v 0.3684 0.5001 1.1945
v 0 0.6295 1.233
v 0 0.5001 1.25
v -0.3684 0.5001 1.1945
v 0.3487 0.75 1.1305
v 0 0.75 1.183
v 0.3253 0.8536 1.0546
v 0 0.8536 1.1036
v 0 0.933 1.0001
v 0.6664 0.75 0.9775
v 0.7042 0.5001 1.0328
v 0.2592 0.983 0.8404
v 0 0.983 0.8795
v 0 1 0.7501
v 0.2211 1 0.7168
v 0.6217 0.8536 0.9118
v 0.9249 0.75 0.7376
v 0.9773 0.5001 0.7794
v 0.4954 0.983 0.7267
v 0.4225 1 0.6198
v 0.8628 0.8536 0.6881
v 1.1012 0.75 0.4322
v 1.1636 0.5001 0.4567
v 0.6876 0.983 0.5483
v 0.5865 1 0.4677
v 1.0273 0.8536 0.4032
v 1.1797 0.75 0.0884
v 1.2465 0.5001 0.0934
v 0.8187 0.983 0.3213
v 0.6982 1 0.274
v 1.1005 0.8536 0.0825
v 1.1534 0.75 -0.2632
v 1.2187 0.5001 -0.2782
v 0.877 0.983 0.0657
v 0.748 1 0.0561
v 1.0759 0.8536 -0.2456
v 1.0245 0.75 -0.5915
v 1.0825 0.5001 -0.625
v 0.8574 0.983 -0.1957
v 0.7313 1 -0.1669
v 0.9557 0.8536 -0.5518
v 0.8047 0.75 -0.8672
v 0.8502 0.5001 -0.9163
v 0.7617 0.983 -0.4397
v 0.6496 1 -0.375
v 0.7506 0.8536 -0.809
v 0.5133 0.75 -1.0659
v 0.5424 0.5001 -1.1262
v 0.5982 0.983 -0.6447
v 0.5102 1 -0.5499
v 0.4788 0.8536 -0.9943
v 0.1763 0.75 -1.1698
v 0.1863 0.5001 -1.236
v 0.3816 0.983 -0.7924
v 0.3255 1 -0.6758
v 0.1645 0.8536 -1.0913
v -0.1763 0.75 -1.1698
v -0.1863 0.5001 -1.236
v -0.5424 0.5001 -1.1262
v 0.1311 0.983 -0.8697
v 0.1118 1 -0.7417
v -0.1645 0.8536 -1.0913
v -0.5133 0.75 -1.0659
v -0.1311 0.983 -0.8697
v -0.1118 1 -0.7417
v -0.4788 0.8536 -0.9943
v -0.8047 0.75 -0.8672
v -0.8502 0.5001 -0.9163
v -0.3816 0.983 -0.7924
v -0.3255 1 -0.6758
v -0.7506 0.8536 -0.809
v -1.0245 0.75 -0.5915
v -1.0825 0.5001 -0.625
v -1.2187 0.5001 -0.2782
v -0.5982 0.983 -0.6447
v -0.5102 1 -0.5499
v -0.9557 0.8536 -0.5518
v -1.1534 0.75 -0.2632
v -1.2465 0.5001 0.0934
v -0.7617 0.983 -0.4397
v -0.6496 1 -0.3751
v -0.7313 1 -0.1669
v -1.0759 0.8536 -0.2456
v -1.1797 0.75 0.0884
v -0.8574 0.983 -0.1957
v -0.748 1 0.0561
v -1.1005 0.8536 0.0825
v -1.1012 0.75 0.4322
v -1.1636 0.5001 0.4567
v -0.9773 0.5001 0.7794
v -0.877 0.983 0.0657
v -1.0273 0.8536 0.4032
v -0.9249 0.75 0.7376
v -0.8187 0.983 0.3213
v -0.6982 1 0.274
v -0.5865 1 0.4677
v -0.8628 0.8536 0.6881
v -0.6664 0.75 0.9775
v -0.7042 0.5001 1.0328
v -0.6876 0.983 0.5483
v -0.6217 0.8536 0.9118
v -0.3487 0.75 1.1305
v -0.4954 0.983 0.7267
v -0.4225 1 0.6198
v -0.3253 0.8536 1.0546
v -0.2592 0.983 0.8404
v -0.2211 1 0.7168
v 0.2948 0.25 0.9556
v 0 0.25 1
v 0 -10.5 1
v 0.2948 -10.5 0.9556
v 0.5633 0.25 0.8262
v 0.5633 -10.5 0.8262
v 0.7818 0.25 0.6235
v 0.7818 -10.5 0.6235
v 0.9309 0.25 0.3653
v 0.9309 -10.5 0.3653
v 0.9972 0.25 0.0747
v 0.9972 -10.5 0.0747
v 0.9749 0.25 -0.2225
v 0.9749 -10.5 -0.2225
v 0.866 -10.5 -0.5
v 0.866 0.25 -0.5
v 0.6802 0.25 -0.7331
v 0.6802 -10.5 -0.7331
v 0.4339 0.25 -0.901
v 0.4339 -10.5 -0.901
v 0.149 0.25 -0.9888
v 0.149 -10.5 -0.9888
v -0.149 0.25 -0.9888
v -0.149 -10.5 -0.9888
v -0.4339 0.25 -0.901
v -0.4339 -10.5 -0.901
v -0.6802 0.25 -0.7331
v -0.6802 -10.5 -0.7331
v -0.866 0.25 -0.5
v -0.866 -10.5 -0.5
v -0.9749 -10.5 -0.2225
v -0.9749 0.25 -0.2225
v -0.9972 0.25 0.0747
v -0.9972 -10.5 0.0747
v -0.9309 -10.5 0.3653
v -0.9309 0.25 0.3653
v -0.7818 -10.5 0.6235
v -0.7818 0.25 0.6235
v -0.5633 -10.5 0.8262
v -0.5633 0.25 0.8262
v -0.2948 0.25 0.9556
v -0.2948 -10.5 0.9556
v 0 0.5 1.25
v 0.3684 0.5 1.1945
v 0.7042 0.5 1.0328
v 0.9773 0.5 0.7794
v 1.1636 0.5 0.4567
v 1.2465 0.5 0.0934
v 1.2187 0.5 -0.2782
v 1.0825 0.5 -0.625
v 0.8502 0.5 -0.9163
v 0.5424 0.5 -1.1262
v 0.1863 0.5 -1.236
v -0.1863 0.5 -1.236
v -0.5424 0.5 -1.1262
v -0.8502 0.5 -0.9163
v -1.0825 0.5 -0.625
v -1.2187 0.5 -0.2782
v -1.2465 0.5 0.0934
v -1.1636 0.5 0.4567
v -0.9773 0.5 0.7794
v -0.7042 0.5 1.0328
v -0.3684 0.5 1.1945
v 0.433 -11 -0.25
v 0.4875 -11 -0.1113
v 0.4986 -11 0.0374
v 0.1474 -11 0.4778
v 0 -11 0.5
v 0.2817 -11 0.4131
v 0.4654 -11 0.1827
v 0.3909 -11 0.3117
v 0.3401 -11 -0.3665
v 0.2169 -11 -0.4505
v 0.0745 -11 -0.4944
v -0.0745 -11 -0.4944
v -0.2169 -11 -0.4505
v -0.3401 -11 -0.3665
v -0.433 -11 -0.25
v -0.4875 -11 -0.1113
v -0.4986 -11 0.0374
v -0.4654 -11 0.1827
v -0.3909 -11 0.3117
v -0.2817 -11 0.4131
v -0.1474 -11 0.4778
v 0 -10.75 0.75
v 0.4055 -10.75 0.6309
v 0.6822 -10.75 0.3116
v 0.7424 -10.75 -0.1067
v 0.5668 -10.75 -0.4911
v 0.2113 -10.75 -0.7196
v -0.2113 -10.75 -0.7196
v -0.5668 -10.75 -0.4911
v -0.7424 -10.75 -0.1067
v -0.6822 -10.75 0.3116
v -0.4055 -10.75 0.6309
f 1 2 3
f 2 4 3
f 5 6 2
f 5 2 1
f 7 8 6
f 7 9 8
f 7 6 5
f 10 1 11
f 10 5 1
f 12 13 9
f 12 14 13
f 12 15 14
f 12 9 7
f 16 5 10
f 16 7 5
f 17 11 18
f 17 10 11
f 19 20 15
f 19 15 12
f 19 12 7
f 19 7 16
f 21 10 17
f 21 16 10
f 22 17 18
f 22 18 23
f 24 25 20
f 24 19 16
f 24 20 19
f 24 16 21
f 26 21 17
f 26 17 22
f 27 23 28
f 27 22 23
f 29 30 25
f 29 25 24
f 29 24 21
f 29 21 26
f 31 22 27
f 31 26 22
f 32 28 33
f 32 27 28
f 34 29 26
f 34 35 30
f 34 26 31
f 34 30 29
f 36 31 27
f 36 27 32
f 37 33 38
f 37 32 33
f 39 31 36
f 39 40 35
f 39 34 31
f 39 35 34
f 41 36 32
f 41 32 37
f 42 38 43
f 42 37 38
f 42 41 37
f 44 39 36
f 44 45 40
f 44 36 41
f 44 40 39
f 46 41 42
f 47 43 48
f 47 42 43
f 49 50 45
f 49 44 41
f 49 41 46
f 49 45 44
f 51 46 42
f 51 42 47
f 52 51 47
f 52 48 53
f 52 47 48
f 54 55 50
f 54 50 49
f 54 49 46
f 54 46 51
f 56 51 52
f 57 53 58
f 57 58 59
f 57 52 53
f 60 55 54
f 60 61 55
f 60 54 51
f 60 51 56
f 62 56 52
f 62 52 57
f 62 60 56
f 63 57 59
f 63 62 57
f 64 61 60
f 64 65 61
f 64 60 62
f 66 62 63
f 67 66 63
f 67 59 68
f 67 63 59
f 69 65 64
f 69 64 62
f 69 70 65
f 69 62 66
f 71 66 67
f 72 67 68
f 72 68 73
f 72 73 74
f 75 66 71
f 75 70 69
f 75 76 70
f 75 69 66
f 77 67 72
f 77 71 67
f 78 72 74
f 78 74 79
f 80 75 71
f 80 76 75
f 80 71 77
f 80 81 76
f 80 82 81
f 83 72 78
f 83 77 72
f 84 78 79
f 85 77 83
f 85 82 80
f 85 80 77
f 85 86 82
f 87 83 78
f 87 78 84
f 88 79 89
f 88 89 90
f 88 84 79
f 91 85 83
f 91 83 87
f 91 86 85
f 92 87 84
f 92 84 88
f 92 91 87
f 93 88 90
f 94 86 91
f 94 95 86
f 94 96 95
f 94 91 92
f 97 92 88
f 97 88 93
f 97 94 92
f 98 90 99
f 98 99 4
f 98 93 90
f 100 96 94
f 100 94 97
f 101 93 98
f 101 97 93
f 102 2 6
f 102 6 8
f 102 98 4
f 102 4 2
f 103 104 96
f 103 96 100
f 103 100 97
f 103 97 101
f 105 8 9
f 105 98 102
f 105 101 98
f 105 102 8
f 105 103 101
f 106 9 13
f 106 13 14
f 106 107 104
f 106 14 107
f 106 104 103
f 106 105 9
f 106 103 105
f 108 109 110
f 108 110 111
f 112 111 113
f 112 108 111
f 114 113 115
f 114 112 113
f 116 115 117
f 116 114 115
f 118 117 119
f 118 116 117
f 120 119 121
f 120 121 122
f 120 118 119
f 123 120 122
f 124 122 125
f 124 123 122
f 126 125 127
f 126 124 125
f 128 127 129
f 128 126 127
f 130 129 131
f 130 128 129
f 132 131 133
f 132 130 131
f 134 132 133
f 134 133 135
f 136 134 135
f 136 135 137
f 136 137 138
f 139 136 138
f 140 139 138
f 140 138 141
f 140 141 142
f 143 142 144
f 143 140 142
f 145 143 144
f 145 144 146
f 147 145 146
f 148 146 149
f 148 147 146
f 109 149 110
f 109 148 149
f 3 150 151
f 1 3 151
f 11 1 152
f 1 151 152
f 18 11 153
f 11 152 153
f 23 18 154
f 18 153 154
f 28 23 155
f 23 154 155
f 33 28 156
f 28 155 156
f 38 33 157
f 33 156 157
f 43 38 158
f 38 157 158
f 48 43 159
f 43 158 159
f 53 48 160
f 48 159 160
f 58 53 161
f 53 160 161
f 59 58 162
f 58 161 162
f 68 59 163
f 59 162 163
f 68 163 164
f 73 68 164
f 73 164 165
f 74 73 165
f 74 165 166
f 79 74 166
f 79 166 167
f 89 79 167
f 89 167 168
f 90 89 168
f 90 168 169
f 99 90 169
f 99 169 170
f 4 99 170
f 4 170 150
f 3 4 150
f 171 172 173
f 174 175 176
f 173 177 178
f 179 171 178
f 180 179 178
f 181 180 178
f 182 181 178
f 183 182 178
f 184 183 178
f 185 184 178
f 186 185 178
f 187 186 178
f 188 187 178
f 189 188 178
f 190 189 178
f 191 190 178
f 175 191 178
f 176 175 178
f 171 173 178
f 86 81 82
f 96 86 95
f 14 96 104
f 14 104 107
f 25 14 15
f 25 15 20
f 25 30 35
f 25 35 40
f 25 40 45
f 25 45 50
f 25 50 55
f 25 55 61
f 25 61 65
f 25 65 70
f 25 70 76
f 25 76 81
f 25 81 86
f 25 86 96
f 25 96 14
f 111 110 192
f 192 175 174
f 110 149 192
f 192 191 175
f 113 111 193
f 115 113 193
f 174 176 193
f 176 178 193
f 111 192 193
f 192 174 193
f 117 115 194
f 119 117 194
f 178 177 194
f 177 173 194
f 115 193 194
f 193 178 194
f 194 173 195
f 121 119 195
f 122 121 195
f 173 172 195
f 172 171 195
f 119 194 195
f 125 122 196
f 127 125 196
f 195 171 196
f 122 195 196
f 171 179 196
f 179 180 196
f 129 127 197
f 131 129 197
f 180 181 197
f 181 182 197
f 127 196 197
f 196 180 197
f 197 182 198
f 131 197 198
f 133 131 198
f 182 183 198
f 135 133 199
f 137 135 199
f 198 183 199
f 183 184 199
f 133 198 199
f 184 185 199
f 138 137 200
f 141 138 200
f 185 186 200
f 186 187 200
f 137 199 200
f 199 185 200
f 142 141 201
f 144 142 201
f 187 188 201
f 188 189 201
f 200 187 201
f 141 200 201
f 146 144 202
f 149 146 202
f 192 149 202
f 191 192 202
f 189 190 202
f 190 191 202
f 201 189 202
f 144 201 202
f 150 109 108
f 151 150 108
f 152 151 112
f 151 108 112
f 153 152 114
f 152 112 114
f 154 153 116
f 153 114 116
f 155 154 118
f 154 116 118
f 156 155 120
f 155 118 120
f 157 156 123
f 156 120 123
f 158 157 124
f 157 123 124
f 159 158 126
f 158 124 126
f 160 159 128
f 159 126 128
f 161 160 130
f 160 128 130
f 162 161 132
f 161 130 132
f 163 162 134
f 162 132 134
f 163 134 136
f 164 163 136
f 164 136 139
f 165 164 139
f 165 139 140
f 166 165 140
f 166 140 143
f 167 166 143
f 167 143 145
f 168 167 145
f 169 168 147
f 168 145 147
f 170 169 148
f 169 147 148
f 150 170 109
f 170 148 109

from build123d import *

# Parameters (mm, degrees)
SKETCH1_R           = 1
BOSS_EXTRUDE1_DEPTH = 11
SKETCH2_R           = 1.25
BOSS_EXTRUDE2_DEPTH = 1
CHAMFER1_SIZE       = 0.5
CHAMFER2_SIZE       = 0.5
FILLET1_R           = 0.5


# Some blends are built 0.0001 mm under size
with BuildPart() as part:
    # Sketch1 → Boss-Extrude1 (new body)
    with BuildSketch(Plane(origin=(0, 0, 0), x_dir=(1, 0, 0), z_dir=(0, 1, 0))):
        with Locations(Location((0, 0, 0), (0, 0, 270))):
            Circle(SKETCH1_R)
    extrude(amount=-BOSS_EXTRUDE1_DEPTH)

    # Sketch2 → Boss-Extrude2 (add)
    with BuildSketch(Plane(origin=(0, 0, 0), x_dir=(1, 0, 0), z_dir=(0, 1, 0))):
        with Locations(Location((0, 0, 0), (0, 0, 270))):
            Circle(SKETCH2_R)
    extrude(amount=BOSS_EXTRUDE2_DEPTH)

    # Chamfer1
    # the kernel refuses this chamfer: 0.5 mm, written as the material it takes off along each edge
    with BuildSketch(Plane(origin=(0, 0, 0), x_dir=(0, 0, 1), z_dir=(-1, 0, 0))) as chamfer1_piece_1_section:
        Polygon((1.25, CHAMFER1_SIZE), (1.25 - CHAMFER1_SIZE, 0), (1.25, 0), align=None)
    chamfer1_piece_1 = revolve(axis=Axis((0, 0, 0), (0, 1, 0)), mode=Mode.PRIVATE)
    chamfer1_piece_1 = chamfer1_piece_1 - Plane(origin=(0, 0.375686262, 0), x_dir=(0, 0, 1), z_dir=(0, 1, 0)) * Cylinder(1, 5, mode=Mode.PRIVATE)
    add(chamfer1_piece_1, mode=Mode.SUBTRACT)

    # Chamfer2
    chamfer2_edges = [part.edges().sort_by_distance(p)[0] for p in [
        (0, -11, -1),
    ]]
    chamfer(chamfer2_edges, length=CHAMFER2_SIZE)

    # Fillet1
    fillet1_edges = [part.edges().sort_by_distance(p)[0] for p in [
        (0, 1, -1.25),
    ]]
    fillet(fillet1_edges, radius=FILLET1_R - 0.0001)  # a hair under: the kernel refuses the full size


solid = part.part
